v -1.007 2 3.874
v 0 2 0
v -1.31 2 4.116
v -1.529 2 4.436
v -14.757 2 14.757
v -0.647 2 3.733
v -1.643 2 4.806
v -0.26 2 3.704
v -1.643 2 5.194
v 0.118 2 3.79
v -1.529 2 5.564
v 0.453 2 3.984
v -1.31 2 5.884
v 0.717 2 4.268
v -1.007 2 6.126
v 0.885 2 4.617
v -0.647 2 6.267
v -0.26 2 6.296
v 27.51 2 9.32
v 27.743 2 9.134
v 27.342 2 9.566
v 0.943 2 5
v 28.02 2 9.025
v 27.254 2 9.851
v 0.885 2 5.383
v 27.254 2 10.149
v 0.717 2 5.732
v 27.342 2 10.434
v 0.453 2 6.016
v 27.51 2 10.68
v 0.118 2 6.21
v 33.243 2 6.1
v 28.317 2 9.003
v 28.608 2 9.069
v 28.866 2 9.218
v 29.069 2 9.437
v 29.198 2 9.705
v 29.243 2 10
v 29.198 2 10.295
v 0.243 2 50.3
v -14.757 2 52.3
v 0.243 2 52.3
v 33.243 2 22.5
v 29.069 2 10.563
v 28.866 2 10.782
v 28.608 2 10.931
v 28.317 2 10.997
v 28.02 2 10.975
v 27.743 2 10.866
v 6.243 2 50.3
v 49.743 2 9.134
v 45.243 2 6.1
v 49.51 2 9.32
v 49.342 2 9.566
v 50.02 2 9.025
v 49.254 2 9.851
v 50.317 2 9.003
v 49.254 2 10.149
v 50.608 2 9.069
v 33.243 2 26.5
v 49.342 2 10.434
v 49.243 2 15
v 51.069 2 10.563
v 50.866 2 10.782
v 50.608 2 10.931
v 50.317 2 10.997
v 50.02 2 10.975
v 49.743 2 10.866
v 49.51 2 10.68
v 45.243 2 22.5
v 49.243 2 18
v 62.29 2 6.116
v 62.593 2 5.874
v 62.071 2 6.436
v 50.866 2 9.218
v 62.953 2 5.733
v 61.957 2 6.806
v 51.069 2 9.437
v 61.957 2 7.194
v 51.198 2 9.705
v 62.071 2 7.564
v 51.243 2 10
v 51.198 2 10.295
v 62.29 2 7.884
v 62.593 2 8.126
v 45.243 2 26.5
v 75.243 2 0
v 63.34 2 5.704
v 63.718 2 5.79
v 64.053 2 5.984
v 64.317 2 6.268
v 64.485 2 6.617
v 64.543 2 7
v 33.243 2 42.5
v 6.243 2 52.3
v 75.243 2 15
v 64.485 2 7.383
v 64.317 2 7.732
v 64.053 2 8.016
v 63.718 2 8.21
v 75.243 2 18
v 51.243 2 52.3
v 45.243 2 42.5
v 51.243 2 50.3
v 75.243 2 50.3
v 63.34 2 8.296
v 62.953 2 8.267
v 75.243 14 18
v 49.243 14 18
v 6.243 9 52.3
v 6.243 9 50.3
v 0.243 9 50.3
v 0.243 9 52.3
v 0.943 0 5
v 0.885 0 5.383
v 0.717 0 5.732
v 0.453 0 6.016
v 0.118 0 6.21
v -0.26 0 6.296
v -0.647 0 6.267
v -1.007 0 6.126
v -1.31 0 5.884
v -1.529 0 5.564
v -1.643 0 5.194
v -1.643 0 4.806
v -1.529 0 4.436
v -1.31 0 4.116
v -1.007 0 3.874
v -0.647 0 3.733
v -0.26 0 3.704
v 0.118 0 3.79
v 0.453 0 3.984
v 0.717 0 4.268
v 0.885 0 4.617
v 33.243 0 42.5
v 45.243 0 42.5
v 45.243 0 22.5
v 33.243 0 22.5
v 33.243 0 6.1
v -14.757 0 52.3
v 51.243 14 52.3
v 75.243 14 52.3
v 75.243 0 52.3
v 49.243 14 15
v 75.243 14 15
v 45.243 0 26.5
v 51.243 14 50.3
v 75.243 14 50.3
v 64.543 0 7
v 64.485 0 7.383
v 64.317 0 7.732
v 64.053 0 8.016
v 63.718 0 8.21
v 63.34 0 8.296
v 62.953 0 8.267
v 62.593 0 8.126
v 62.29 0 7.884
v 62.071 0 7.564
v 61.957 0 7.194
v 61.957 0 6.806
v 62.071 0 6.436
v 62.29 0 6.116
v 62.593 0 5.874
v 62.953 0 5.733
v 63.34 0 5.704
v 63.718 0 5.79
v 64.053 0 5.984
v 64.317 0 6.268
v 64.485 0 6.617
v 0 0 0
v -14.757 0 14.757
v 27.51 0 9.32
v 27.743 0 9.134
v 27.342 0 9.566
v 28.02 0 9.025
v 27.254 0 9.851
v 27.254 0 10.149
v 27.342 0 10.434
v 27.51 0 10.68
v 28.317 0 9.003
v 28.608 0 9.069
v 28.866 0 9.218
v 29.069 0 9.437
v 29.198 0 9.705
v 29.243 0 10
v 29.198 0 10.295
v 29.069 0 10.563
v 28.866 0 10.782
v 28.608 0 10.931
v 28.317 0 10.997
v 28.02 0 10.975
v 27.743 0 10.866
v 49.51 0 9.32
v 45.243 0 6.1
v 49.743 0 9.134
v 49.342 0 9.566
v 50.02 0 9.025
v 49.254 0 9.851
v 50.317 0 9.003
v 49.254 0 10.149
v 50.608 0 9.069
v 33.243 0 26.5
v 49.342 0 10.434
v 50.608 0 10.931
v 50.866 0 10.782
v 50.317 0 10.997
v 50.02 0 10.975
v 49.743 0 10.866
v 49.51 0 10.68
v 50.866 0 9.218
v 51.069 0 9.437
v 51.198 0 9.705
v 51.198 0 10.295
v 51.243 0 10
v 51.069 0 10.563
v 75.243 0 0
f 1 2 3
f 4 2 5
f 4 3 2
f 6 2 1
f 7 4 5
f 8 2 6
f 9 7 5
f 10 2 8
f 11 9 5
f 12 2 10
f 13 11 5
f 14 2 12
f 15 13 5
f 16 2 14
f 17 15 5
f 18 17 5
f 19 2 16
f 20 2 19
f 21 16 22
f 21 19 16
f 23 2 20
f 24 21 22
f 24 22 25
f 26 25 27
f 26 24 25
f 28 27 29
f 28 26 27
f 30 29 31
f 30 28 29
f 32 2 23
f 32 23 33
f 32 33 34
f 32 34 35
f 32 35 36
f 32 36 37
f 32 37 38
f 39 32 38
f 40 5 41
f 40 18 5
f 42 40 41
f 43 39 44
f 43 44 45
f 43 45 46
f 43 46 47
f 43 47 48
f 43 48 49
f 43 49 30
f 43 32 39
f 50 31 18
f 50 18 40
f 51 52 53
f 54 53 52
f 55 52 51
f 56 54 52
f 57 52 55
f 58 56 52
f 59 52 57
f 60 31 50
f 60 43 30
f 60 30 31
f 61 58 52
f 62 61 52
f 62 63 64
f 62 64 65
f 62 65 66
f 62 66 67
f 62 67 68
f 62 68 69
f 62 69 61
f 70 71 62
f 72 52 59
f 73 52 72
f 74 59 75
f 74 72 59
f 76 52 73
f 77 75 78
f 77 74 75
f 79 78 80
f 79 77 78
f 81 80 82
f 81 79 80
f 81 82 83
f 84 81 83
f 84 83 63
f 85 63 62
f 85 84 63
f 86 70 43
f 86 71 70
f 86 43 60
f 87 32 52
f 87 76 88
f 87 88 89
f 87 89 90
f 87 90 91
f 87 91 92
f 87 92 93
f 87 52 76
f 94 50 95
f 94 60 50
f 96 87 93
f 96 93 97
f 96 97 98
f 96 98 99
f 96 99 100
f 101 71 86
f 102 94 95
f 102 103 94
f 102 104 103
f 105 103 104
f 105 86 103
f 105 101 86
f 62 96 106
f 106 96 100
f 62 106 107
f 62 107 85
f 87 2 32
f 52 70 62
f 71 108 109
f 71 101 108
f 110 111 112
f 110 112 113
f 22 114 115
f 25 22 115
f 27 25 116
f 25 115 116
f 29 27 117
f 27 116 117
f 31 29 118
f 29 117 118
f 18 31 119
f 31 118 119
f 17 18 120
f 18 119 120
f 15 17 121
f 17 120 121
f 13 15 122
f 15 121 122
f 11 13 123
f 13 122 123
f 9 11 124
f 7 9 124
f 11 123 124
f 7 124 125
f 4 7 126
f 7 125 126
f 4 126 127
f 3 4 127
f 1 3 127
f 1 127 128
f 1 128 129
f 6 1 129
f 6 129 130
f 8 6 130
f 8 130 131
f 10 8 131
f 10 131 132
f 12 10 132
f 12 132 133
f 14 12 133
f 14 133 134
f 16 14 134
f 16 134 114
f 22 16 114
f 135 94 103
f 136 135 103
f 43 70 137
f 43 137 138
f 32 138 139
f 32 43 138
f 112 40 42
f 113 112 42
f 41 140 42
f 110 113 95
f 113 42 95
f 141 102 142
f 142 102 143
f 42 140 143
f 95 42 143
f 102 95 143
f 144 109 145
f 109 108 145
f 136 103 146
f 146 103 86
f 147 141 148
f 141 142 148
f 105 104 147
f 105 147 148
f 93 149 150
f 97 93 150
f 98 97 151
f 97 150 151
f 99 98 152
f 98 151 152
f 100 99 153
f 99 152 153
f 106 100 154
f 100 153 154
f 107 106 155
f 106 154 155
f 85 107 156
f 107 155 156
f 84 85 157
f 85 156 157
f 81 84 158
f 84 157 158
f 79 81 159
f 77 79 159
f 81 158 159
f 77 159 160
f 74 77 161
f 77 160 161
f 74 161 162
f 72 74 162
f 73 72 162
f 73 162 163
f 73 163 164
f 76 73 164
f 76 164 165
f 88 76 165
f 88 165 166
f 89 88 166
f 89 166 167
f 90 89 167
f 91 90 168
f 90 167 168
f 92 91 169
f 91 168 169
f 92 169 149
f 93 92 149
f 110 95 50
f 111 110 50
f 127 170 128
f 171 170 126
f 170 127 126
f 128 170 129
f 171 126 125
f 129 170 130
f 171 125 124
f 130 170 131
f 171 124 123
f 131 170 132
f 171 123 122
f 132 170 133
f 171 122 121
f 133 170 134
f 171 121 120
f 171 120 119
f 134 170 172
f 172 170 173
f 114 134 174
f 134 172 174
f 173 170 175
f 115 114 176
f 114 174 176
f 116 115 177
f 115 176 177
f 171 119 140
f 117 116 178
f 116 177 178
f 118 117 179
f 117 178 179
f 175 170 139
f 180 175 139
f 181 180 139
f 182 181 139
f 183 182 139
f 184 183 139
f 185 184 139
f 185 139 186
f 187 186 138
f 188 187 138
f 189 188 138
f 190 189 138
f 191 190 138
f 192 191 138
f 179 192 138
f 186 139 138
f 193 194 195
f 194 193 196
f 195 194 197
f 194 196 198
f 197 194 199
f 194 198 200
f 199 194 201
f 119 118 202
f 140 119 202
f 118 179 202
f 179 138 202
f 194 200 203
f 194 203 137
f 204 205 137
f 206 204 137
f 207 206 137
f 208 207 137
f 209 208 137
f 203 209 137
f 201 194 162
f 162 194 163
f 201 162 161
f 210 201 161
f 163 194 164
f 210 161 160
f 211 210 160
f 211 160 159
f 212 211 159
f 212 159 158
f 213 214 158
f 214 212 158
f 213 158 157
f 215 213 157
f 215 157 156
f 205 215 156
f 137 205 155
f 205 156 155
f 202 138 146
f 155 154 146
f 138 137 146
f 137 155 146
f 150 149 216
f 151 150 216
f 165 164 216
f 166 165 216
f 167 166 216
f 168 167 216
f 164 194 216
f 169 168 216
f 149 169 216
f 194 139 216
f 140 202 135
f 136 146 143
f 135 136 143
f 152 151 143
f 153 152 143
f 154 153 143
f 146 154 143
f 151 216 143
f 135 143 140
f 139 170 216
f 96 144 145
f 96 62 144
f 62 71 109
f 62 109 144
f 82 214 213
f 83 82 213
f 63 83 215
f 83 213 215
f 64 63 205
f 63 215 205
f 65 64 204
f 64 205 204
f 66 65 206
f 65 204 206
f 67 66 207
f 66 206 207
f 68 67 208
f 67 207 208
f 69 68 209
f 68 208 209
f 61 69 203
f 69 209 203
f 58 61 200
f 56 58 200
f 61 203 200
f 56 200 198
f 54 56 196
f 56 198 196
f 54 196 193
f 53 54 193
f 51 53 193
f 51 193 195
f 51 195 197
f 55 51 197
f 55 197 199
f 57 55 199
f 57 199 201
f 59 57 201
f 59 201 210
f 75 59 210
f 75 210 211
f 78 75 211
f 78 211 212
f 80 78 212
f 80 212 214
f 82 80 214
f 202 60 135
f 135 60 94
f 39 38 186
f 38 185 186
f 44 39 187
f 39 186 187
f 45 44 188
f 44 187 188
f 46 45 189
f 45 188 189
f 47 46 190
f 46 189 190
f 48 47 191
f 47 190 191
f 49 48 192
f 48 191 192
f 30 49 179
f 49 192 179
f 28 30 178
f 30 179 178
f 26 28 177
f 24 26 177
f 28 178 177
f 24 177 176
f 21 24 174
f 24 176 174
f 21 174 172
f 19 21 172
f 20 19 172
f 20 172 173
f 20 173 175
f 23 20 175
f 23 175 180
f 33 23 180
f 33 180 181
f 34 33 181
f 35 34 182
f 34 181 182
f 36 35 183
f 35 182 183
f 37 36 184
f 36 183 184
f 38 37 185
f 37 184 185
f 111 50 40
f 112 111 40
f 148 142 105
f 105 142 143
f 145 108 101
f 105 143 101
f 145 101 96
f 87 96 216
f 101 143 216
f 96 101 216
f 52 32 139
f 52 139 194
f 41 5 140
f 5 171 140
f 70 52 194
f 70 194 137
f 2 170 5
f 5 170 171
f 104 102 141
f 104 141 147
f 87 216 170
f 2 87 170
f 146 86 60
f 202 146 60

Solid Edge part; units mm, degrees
sketch "Sketch1" plane through (0, 0, 0) normal (0, -1, 0) x (1, 0, 0)
  line L0 (75.2427, 0) -> (0, 0)
  line L1 (0, 0) -> (-14.7573, 14.7573)
  line L2 (-14.7573, 14.7573) -> (-14.7573, 52.3)
  line L3 (-14.7573, 52.3) -> (75.2427, 52.3)
  line L4 (75.2427, 52.3) -> (75.2427, 0)
  dimension "D1" = 90
  dimension "D2" = 20.87
  dimension "D3" = 52.3
extrude "Protrusion1" add sketch "Sketch1" against normal blind 2
sketch "Sketch2" plane through (30.2427, 2, 26.15) normal (0, 1, 0) x (-1, 0, 0)
  line L0 (-15, -3.65) -> (-3, -3.65)
  line L1 (-3, -3.65) -> (-3, -20.05)
  line L2 (-3, -20.05) -> (-15, -20.05)
  line L3 (-15, -20.05) -> (-15, -3.65)
  dimension "D1" = 12
  dimension "D2" = 48
  dimension "D3" = 22.5
  dimension "D4" = 16.4
extrude "Cutout1" cut sketch "Sketch2" against normal through all
sketch "Sketch3" plane through (30.2427, 2, 26.15) normal (0, 1, 0) x (-1, 0, 0)
  line L0 (-15, 0.35) -> (-3, 0.35)
  line L1 (-3, 0.35) -> (-3, 16.35)
  line L2 (-3, 16.35) -> (-15, 16.35)
  line L3 (-15, 16.35) -> (-15, 0.35)
  dimension "D1" = 16
  dimension "D2" = 4
extrude "Cutout2" cut sketch "Sketch3" against normal through all
sketch "Sketch4" plane through (30.2427, 2, 26.15) normal (0, 1, 0) x (-1, 0, 0)
  line L0 (-45, -8.15) -> (-19, -8.15)
  line L1 (-19, -8.15) -> (-19, -11.15)
  line L2 (-19, -11.15) -> (-45, -11.15)
  line L3 (-45, -11.15) -> (-45, -8.15)
  dimension "D1" = 26
  dimension "D2" = 3
  dimension "D3" = 15
extrude "Extrusionsausprägung_2" add sketch "Sketch4" along normal blind 12
sketch "Sketch5" plane through (30.2427, 2, 26.15) normal (0, 1, 0) x (-1, 0, 0)
  line L0 (-45, 26.15) -> (-21, 26.15)
  line L1 (-21, 26.15) -> (-21, 24.15)
  line L2 (-21, 24.15) -> (-45, 24.15)
  line L3 (-45, 24.15) -> (-45, 26.15)
  dimension "D1" = 2
  dimension "D2" = 24
extrude "Protrusion2" add sketch "Sketch5" along normal up to vertex (12 mm away)
sketch "Sketch6" plane through (30.2427, 2, 26.15) normal (0, 1, 0) x (-1, 0, 0)
  line L0 (30, 26.15) -> (24, 26.15)
  line L1 (24, 26.15) -> (24, 24.15)
  line L2 (24, 24.15) -> (30, 24.15)
  line L3 (30, 24.15) -> (30, 26.15)
  dimension "D1" = 6
  dimension "D2" = 2
  dimension "D3" = 15
extrude "Extrusionsausprägung_4" add sketch "Sketch6" along normal blind 7
sketch "Sketch7" plane through (30.2427, 0, 26.15) normal (0, -1, 0) x (1, 0, 0)
  circle A0 centre (-2, -16.15) radius 1
  circle A1 centre (20, -16.15) radius 1
  dimension "D1" = 2
  dimension "D2" = 5
  dimension "D3" = 5
  dimension "D4" = 10
extrude "Cutout3" cut sketch "Sketch7" against normal through all
sketch "Sketch8" plane through (30.2427, 0, 26.15) normal (0, -1, 0) x (1, 0, 0)
  circle A0 centre (33, -19.15) radius 1.3
  dimension "D1" = 2.6
  dimension "D2" = 12
  dimension "D3" = 7
extrude "Cutout4" cut sketch "Sketch8" against normal through all
sketch "Sketch9" plane through (30.2427, 0, 26.15) normal (0, -1, 0) x (1, 0, 0)
  circle A0 centre (-30.6, -21.15) radius 1.3
  dimension "D1" = 5
  dimension "D2" = 63.6
extrude "Cutout5" cut sketch "Sketch9" against normal through all
